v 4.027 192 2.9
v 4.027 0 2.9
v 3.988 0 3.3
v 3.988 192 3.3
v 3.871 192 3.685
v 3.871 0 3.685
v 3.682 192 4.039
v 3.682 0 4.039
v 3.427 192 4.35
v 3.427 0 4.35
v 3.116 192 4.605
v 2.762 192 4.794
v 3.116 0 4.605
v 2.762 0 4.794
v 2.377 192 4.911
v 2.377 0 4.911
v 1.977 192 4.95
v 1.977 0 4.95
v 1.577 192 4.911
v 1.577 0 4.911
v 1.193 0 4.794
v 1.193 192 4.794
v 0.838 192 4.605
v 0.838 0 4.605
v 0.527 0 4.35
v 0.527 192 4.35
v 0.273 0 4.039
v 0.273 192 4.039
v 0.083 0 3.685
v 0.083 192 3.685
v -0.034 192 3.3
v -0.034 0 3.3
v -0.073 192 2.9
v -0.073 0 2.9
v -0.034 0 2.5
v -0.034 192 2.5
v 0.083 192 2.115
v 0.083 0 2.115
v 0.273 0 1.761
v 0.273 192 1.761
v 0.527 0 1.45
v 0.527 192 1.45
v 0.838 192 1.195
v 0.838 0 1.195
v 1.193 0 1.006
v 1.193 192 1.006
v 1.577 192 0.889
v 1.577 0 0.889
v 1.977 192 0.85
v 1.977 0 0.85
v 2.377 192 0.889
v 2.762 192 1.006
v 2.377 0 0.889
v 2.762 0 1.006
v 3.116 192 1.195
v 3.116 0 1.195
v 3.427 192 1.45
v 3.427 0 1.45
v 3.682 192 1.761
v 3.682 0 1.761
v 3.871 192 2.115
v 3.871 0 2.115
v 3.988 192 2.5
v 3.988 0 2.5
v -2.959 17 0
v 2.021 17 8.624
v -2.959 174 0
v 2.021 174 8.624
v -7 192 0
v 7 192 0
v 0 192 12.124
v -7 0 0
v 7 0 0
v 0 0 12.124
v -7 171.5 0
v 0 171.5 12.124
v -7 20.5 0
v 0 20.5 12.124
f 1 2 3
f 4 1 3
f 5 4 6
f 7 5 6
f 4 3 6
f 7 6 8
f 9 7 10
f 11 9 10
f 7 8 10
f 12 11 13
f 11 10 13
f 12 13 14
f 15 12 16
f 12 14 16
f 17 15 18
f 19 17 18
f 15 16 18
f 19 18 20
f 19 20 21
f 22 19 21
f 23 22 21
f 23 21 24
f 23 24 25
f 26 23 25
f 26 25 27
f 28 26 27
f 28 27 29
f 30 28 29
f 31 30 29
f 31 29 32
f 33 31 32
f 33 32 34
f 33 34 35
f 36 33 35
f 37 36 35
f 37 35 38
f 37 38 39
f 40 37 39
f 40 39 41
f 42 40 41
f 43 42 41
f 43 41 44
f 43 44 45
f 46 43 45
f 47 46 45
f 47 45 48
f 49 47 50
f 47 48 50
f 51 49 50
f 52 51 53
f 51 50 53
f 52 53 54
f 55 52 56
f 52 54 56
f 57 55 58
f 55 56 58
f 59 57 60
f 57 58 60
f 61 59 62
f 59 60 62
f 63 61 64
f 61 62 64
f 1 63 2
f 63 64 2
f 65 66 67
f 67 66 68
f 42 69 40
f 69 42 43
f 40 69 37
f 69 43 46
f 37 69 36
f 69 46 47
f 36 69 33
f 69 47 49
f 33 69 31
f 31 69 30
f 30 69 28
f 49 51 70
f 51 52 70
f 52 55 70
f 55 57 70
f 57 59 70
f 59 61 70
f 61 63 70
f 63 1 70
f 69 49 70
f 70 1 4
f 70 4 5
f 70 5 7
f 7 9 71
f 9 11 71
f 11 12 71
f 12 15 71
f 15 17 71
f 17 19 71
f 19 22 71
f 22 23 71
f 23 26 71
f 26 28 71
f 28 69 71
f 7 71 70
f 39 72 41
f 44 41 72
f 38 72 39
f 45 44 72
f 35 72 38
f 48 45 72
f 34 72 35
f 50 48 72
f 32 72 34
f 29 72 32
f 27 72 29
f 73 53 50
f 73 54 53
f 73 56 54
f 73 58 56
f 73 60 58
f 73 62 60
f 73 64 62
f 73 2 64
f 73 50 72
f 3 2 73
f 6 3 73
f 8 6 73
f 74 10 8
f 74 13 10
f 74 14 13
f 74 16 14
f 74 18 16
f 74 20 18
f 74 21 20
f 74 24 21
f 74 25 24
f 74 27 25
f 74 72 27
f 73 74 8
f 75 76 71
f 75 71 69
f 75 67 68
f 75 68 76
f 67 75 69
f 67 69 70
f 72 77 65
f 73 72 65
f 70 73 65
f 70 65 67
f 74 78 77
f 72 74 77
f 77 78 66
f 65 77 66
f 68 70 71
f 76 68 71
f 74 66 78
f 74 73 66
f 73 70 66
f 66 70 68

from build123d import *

# Parameters (mm, degrees)
F1_DEPTH = 192
F5_DEPTH = 12.5
F6_R     = 2.05
F7_DEPTH = 200


with BuildPart() as f1:
    # F0 (on Front) → F1 (new body)
    with BuildSketch(Plane.XZ):
        Polygon((0, 12.124355653), (-7, 0), (7, 0), align=None)
    extrude(amount=-F1_DEPTH)

    # F4 (on 3pt) → F5 (cut, symmetric)
    with BuildSketch(Plane(origin=(1.75, 0, 3.0310889132), x_dir=(0.8660254038, 0, -0.5), z_dir=(0.5, 0, 0.8660254038))):
        Polygon((-6.0621778265, 20.5), (-2.5621778265, 17), (-2.5621778265, 174), (-6.0621778265, 171.5), align=None)
    extrude(amount=F5_DEPTH, both=True, mode=Mode.SUBTRACT)

    # F6 (on Front) → F7 (cut)
    with BuildSketch(Plane.XZ):
        with Locations((1.9770526581, 2.9)):
            Circle(F6_R)
    extrude(amount=-F7_DEPTH, mode=Mode.SUBTRACT)


solid = f1.part
